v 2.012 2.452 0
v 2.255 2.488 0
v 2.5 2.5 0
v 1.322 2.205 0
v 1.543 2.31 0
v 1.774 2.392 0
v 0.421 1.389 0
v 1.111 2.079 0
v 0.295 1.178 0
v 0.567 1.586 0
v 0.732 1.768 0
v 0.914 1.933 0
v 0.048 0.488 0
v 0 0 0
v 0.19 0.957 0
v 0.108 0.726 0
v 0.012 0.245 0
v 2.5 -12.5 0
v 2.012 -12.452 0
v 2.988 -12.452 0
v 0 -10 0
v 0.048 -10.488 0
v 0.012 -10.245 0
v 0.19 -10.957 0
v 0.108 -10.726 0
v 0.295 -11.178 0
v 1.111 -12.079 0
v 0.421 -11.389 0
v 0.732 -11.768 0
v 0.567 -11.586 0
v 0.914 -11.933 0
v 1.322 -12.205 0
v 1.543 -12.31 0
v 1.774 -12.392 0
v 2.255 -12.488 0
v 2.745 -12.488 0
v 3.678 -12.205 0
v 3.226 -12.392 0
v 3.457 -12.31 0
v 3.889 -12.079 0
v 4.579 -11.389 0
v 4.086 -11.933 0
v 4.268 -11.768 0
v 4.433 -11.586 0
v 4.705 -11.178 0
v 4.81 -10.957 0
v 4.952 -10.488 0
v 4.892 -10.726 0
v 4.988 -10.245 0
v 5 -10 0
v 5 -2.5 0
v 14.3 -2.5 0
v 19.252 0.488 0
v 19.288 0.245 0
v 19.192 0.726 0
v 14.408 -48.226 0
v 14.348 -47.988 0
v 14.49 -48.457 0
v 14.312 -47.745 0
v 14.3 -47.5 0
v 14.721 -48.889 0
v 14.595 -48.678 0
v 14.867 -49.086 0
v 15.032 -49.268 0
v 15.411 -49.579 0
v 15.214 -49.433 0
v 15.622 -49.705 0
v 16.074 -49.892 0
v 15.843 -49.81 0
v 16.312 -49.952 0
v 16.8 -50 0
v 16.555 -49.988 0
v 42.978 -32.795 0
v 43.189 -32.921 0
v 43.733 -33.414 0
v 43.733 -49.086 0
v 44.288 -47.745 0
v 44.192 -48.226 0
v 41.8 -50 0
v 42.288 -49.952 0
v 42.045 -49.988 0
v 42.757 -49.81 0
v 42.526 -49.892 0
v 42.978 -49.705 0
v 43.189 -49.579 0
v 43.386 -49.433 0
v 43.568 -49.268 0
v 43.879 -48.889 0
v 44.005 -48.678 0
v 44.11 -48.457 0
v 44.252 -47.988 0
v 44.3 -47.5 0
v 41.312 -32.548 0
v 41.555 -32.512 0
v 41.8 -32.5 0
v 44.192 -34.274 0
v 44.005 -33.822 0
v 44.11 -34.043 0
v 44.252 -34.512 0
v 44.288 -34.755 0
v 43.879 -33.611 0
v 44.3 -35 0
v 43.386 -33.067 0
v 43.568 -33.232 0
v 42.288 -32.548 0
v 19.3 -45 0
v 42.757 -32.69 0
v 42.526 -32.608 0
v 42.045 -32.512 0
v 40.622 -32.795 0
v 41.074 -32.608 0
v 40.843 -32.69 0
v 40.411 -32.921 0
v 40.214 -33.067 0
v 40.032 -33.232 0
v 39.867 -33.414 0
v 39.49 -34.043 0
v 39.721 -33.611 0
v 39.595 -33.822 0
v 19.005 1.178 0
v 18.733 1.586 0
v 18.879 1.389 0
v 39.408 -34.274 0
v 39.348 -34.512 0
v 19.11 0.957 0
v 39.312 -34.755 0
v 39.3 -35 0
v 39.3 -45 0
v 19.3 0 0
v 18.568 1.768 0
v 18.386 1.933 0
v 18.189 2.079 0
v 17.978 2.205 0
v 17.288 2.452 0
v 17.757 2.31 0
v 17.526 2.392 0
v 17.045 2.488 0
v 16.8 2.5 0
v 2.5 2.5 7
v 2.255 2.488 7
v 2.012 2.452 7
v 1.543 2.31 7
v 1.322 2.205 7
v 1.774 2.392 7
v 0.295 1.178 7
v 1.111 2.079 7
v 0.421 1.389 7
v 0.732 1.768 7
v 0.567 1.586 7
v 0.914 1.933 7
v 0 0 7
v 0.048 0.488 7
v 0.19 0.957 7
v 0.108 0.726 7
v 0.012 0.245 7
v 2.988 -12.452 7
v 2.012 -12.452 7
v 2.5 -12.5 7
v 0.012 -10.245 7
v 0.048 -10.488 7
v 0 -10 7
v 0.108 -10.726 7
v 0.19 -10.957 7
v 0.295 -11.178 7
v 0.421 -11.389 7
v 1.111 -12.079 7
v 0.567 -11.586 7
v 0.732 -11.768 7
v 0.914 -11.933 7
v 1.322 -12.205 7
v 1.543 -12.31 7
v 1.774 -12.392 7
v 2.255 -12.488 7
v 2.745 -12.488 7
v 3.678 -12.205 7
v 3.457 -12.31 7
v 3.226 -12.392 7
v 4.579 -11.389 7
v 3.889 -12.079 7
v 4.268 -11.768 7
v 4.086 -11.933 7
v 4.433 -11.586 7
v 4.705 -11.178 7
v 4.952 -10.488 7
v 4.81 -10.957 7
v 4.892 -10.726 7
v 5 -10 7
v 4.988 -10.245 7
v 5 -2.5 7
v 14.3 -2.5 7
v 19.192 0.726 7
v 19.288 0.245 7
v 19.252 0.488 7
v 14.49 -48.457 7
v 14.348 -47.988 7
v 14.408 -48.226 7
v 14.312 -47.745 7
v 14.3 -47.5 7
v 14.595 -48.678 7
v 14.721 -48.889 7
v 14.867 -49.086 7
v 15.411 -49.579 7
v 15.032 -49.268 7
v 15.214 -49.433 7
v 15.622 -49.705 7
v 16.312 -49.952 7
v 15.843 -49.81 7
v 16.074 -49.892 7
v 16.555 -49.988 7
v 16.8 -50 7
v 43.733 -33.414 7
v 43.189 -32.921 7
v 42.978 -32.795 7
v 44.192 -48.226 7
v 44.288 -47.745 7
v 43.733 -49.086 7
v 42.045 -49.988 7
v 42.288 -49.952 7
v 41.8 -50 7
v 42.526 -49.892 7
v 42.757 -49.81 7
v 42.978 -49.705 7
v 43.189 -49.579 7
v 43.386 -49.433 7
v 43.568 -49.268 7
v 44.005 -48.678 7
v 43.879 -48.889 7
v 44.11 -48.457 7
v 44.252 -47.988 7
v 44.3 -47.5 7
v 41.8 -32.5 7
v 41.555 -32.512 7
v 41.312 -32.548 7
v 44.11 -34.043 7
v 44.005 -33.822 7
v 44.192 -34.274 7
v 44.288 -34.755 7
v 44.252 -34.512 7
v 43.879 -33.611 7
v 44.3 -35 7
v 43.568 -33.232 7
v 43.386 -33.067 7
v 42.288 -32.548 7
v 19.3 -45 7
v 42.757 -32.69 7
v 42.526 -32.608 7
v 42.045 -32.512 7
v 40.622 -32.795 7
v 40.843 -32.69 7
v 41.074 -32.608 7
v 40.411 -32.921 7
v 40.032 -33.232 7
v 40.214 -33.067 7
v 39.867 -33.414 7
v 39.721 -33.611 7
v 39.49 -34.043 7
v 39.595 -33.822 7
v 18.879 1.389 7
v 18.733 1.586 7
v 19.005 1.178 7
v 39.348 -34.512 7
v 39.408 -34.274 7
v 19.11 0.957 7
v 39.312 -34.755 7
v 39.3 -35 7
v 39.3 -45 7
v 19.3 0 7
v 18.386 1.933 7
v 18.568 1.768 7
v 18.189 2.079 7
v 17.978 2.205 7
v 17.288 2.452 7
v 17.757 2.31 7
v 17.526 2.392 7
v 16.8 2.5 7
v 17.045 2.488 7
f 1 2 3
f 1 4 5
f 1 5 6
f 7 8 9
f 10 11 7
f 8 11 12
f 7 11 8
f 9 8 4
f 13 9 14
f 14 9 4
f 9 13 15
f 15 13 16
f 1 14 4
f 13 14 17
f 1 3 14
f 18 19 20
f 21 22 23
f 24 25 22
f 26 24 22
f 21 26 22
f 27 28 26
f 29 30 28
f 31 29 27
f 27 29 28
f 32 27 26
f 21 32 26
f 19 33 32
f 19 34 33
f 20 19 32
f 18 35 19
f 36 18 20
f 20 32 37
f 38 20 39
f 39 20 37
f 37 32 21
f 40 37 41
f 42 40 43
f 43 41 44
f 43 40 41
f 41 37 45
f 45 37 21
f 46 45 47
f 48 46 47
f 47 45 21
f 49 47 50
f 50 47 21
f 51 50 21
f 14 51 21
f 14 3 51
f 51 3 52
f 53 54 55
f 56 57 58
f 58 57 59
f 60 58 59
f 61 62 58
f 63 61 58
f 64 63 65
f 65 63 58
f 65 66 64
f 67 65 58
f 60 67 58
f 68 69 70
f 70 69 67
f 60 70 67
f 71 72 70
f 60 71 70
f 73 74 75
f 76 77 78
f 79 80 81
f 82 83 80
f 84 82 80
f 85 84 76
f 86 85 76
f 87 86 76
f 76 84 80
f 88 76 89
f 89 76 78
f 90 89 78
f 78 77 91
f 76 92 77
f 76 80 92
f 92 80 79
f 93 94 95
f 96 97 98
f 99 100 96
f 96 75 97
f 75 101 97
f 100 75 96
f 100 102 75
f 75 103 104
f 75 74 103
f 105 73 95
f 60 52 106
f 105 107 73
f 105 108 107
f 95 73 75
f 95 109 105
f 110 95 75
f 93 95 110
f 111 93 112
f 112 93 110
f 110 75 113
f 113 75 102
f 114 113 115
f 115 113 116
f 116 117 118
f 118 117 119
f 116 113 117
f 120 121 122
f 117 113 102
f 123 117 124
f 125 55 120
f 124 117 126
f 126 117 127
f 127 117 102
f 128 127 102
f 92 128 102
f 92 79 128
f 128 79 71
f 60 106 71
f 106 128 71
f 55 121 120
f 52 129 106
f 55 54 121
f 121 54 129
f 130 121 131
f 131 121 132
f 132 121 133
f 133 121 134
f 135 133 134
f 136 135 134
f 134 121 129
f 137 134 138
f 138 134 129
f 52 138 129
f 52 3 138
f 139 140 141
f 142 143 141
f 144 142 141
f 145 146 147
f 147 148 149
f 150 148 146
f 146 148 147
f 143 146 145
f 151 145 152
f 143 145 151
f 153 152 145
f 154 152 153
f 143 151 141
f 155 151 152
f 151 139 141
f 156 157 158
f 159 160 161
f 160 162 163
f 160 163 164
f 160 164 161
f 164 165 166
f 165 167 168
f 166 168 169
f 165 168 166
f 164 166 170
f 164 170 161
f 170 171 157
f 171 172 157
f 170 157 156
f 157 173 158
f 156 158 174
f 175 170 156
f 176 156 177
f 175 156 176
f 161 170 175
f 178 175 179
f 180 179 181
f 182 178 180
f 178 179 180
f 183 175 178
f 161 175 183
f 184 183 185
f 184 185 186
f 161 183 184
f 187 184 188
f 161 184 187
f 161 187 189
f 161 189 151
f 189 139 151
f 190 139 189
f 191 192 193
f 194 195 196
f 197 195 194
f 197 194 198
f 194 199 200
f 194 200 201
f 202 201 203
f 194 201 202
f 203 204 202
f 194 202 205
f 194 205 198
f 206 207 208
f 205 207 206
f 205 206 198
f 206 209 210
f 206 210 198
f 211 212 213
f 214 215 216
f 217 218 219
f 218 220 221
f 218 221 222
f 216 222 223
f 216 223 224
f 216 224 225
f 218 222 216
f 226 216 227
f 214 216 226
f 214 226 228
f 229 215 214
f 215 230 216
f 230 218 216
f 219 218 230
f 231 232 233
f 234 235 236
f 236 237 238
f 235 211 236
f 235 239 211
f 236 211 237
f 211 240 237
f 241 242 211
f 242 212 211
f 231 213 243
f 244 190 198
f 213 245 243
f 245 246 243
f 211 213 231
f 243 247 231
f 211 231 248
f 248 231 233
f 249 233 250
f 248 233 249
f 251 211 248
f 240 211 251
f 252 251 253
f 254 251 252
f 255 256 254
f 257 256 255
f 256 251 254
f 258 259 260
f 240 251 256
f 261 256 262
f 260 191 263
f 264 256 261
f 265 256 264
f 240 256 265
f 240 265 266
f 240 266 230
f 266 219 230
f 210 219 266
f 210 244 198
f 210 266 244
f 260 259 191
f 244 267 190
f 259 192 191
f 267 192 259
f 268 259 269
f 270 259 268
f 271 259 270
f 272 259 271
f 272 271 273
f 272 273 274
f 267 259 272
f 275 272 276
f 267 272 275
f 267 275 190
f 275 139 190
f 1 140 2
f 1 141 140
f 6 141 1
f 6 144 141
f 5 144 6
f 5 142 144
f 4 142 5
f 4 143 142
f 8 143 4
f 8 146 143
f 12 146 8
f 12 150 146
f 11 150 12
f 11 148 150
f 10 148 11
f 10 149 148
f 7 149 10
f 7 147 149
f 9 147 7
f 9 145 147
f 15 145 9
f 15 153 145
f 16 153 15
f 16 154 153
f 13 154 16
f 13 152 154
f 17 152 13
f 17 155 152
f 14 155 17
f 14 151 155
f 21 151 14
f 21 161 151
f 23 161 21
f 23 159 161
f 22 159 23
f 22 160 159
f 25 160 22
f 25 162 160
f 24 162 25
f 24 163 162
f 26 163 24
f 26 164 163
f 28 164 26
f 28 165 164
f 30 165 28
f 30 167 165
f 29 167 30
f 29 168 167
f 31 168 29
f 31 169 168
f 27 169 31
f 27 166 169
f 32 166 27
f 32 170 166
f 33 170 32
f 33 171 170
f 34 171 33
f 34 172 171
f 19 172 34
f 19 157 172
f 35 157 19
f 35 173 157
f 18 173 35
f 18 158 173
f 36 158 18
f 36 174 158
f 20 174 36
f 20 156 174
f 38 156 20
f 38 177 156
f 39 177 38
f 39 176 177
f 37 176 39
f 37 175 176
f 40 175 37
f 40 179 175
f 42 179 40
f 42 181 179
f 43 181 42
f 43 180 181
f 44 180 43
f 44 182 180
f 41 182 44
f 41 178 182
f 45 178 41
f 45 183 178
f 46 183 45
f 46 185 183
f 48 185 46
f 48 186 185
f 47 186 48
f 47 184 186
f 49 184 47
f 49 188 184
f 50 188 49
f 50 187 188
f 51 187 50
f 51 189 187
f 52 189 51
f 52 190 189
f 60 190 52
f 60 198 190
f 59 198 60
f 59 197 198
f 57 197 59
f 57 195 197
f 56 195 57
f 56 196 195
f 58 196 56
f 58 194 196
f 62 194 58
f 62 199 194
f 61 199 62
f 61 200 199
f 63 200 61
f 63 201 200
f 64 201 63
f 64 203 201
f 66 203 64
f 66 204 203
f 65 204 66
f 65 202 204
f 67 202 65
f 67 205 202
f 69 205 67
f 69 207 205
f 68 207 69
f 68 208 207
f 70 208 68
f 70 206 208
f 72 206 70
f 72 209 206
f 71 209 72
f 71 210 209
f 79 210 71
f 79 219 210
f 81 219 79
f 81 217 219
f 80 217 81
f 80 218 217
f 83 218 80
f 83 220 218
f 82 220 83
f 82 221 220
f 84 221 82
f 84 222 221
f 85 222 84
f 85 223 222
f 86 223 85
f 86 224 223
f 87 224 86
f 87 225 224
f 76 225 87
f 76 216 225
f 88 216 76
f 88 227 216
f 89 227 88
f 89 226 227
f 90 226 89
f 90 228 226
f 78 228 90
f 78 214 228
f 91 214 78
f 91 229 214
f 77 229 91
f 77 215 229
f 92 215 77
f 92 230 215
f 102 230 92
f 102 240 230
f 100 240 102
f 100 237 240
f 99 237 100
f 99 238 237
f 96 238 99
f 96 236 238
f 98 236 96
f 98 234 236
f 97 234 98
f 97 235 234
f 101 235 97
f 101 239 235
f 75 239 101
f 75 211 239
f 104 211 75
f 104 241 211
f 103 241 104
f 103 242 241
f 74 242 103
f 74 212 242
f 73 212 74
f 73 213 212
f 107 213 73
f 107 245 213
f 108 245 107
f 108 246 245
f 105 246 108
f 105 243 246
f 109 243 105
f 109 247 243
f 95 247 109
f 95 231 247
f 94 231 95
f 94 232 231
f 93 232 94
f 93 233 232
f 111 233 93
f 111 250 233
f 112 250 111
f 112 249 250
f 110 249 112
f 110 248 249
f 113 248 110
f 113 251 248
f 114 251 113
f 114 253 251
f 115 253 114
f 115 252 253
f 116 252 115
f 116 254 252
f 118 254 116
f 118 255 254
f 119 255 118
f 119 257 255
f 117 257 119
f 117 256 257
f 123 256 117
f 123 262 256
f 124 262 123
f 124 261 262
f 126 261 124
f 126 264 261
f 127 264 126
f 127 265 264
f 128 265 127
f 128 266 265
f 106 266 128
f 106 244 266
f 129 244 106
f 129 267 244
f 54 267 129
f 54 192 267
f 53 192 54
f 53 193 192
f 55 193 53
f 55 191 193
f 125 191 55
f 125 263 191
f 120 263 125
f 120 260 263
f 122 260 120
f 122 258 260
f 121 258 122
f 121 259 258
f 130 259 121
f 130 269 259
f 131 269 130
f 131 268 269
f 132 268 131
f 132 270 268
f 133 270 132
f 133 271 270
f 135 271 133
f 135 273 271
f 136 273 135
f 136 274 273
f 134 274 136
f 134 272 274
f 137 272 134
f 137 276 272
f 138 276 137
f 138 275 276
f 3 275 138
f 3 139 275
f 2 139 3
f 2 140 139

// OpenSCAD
$fn = 64;

door_thickness = 8.5;
clearance = .8;

hook_width = 7;
wall = 5;

back_drop = 10;
front_drop = 50;

hook_reach = 25;
hook_tip_height = 15;

outer_depth = door_thickness + clearance + wall * 2;
r = wall / 2;

linear_extrude(hook_width)
    profile();

module profile() {
    union() {
        // Top section over the door.
        rounded_bar([r, 0], [outer_depth - r, 0], r);

        // Back tab that stays behind the door.
        rounded_bar([r, 0], [r, -back_drop], r);

        // Front leg.
        rounded_bar([outer_depth - r, 0], [outer_depth - r, -front_drop + r], r);

        // Rounded bottom of the outer hook.
        rounded_bar([outer_depth - r, -front_drop + r], [outer_depth + hook_reach - r, -front_drop + r], r);

        // Upturned outer tip.
        rounded_bar(
            [outer_depth + hook_reach - r, -front_drop + r],
            [outer_depth + hook_reach - r, -front_drop + hook_tip_height],
            r
        );
    }
}

module rounded_bar(start, end, radius) {
    hull() {
        translate(start) circle(r = radius);
        translate(end) circle(r = radius);
    }
}
